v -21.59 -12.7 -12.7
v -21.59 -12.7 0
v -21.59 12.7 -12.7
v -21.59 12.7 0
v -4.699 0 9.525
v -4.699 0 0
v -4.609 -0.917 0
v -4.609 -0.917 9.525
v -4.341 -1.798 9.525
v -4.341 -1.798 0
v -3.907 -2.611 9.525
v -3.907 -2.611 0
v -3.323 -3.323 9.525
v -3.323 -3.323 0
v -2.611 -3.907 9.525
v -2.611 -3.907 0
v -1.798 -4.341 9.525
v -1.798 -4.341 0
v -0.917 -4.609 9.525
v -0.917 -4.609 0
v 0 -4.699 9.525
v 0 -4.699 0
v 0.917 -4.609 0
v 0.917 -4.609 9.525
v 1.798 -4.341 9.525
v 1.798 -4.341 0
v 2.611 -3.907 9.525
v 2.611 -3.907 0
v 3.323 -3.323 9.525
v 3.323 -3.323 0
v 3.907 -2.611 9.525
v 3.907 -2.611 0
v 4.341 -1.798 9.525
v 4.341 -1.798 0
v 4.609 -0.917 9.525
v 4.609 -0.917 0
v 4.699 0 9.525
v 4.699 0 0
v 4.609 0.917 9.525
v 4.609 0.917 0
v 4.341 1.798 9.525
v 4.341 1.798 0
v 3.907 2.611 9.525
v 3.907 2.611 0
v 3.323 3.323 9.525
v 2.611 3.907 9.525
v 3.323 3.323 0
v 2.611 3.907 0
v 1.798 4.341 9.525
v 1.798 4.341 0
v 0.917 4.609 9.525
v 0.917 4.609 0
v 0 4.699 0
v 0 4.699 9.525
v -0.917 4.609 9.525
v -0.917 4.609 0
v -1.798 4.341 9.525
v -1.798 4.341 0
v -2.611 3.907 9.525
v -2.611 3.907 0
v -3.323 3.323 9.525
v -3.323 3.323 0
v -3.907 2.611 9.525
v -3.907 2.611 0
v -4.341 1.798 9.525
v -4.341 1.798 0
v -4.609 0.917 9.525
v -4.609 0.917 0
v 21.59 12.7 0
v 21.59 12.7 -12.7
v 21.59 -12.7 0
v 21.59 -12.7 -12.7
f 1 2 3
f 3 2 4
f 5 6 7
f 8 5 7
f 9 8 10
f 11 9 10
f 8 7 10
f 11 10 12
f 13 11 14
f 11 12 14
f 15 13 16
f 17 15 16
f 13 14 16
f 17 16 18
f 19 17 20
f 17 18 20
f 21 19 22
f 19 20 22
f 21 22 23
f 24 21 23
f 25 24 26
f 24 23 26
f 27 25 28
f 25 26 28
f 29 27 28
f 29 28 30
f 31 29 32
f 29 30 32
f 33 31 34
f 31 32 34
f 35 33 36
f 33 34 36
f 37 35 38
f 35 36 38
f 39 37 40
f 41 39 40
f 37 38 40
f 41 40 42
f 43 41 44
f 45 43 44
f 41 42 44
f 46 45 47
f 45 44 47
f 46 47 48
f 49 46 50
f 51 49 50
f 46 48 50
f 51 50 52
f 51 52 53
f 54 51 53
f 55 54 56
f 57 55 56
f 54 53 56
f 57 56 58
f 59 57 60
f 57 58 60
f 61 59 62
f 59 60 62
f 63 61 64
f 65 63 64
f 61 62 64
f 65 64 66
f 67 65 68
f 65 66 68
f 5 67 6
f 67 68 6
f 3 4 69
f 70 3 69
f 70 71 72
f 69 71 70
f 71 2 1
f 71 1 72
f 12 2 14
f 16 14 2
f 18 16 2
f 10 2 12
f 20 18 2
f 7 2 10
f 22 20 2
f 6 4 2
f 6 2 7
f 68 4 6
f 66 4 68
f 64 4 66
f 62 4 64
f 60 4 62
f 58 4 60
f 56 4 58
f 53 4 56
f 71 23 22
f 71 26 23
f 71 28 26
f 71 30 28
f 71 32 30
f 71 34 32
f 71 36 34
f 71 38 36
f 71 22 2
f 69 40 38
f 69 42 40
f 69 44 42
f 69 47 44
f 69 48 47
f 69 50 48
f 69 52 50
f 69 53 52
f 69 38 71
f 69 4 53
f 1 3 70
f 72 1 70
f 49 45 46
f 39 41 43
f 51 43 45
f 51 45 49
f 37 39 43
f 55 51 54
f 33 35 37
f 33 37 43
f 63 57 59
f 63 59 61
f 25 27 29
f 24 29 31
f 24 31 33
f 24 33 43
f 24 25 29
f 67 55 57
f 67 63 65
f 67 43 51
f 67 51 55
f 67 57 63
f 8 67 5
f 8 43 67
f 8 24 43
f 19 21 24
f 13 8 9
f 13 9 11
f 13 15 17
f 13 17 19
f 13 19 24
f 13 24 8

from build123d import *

# Parameters (mm, degrees)
SKETCH2_W           = 43.18
SKETCH2_H           = 25.4
BOSS_EXTRUDE3_DEPTH = 12.7
SKETCH4_R           = 4.699
BOSS_EXTRUDE4_DEPTH = 9.525


with BuildPart() as part:
    # Sketch2 → Boss-Extrude3 (new body)
    with BuildSketch(Plane.XY):
        Rectangle(SKETCH2_W, SKETCH2_H)
    extrude(amount=-BOSS_EXTRUDE3_DEPTH)

    # Sketch4 → Boss-Extrude4 (add)
    with BuildSketch(Plane.XY):
        with Locations(Location((0, 0, 0), (0, 0, 180))):
            Circle(SKETCH4_R)
    extrude(amount=BOSS_EXTRUDE4_DEPTH)


solid = part.part
